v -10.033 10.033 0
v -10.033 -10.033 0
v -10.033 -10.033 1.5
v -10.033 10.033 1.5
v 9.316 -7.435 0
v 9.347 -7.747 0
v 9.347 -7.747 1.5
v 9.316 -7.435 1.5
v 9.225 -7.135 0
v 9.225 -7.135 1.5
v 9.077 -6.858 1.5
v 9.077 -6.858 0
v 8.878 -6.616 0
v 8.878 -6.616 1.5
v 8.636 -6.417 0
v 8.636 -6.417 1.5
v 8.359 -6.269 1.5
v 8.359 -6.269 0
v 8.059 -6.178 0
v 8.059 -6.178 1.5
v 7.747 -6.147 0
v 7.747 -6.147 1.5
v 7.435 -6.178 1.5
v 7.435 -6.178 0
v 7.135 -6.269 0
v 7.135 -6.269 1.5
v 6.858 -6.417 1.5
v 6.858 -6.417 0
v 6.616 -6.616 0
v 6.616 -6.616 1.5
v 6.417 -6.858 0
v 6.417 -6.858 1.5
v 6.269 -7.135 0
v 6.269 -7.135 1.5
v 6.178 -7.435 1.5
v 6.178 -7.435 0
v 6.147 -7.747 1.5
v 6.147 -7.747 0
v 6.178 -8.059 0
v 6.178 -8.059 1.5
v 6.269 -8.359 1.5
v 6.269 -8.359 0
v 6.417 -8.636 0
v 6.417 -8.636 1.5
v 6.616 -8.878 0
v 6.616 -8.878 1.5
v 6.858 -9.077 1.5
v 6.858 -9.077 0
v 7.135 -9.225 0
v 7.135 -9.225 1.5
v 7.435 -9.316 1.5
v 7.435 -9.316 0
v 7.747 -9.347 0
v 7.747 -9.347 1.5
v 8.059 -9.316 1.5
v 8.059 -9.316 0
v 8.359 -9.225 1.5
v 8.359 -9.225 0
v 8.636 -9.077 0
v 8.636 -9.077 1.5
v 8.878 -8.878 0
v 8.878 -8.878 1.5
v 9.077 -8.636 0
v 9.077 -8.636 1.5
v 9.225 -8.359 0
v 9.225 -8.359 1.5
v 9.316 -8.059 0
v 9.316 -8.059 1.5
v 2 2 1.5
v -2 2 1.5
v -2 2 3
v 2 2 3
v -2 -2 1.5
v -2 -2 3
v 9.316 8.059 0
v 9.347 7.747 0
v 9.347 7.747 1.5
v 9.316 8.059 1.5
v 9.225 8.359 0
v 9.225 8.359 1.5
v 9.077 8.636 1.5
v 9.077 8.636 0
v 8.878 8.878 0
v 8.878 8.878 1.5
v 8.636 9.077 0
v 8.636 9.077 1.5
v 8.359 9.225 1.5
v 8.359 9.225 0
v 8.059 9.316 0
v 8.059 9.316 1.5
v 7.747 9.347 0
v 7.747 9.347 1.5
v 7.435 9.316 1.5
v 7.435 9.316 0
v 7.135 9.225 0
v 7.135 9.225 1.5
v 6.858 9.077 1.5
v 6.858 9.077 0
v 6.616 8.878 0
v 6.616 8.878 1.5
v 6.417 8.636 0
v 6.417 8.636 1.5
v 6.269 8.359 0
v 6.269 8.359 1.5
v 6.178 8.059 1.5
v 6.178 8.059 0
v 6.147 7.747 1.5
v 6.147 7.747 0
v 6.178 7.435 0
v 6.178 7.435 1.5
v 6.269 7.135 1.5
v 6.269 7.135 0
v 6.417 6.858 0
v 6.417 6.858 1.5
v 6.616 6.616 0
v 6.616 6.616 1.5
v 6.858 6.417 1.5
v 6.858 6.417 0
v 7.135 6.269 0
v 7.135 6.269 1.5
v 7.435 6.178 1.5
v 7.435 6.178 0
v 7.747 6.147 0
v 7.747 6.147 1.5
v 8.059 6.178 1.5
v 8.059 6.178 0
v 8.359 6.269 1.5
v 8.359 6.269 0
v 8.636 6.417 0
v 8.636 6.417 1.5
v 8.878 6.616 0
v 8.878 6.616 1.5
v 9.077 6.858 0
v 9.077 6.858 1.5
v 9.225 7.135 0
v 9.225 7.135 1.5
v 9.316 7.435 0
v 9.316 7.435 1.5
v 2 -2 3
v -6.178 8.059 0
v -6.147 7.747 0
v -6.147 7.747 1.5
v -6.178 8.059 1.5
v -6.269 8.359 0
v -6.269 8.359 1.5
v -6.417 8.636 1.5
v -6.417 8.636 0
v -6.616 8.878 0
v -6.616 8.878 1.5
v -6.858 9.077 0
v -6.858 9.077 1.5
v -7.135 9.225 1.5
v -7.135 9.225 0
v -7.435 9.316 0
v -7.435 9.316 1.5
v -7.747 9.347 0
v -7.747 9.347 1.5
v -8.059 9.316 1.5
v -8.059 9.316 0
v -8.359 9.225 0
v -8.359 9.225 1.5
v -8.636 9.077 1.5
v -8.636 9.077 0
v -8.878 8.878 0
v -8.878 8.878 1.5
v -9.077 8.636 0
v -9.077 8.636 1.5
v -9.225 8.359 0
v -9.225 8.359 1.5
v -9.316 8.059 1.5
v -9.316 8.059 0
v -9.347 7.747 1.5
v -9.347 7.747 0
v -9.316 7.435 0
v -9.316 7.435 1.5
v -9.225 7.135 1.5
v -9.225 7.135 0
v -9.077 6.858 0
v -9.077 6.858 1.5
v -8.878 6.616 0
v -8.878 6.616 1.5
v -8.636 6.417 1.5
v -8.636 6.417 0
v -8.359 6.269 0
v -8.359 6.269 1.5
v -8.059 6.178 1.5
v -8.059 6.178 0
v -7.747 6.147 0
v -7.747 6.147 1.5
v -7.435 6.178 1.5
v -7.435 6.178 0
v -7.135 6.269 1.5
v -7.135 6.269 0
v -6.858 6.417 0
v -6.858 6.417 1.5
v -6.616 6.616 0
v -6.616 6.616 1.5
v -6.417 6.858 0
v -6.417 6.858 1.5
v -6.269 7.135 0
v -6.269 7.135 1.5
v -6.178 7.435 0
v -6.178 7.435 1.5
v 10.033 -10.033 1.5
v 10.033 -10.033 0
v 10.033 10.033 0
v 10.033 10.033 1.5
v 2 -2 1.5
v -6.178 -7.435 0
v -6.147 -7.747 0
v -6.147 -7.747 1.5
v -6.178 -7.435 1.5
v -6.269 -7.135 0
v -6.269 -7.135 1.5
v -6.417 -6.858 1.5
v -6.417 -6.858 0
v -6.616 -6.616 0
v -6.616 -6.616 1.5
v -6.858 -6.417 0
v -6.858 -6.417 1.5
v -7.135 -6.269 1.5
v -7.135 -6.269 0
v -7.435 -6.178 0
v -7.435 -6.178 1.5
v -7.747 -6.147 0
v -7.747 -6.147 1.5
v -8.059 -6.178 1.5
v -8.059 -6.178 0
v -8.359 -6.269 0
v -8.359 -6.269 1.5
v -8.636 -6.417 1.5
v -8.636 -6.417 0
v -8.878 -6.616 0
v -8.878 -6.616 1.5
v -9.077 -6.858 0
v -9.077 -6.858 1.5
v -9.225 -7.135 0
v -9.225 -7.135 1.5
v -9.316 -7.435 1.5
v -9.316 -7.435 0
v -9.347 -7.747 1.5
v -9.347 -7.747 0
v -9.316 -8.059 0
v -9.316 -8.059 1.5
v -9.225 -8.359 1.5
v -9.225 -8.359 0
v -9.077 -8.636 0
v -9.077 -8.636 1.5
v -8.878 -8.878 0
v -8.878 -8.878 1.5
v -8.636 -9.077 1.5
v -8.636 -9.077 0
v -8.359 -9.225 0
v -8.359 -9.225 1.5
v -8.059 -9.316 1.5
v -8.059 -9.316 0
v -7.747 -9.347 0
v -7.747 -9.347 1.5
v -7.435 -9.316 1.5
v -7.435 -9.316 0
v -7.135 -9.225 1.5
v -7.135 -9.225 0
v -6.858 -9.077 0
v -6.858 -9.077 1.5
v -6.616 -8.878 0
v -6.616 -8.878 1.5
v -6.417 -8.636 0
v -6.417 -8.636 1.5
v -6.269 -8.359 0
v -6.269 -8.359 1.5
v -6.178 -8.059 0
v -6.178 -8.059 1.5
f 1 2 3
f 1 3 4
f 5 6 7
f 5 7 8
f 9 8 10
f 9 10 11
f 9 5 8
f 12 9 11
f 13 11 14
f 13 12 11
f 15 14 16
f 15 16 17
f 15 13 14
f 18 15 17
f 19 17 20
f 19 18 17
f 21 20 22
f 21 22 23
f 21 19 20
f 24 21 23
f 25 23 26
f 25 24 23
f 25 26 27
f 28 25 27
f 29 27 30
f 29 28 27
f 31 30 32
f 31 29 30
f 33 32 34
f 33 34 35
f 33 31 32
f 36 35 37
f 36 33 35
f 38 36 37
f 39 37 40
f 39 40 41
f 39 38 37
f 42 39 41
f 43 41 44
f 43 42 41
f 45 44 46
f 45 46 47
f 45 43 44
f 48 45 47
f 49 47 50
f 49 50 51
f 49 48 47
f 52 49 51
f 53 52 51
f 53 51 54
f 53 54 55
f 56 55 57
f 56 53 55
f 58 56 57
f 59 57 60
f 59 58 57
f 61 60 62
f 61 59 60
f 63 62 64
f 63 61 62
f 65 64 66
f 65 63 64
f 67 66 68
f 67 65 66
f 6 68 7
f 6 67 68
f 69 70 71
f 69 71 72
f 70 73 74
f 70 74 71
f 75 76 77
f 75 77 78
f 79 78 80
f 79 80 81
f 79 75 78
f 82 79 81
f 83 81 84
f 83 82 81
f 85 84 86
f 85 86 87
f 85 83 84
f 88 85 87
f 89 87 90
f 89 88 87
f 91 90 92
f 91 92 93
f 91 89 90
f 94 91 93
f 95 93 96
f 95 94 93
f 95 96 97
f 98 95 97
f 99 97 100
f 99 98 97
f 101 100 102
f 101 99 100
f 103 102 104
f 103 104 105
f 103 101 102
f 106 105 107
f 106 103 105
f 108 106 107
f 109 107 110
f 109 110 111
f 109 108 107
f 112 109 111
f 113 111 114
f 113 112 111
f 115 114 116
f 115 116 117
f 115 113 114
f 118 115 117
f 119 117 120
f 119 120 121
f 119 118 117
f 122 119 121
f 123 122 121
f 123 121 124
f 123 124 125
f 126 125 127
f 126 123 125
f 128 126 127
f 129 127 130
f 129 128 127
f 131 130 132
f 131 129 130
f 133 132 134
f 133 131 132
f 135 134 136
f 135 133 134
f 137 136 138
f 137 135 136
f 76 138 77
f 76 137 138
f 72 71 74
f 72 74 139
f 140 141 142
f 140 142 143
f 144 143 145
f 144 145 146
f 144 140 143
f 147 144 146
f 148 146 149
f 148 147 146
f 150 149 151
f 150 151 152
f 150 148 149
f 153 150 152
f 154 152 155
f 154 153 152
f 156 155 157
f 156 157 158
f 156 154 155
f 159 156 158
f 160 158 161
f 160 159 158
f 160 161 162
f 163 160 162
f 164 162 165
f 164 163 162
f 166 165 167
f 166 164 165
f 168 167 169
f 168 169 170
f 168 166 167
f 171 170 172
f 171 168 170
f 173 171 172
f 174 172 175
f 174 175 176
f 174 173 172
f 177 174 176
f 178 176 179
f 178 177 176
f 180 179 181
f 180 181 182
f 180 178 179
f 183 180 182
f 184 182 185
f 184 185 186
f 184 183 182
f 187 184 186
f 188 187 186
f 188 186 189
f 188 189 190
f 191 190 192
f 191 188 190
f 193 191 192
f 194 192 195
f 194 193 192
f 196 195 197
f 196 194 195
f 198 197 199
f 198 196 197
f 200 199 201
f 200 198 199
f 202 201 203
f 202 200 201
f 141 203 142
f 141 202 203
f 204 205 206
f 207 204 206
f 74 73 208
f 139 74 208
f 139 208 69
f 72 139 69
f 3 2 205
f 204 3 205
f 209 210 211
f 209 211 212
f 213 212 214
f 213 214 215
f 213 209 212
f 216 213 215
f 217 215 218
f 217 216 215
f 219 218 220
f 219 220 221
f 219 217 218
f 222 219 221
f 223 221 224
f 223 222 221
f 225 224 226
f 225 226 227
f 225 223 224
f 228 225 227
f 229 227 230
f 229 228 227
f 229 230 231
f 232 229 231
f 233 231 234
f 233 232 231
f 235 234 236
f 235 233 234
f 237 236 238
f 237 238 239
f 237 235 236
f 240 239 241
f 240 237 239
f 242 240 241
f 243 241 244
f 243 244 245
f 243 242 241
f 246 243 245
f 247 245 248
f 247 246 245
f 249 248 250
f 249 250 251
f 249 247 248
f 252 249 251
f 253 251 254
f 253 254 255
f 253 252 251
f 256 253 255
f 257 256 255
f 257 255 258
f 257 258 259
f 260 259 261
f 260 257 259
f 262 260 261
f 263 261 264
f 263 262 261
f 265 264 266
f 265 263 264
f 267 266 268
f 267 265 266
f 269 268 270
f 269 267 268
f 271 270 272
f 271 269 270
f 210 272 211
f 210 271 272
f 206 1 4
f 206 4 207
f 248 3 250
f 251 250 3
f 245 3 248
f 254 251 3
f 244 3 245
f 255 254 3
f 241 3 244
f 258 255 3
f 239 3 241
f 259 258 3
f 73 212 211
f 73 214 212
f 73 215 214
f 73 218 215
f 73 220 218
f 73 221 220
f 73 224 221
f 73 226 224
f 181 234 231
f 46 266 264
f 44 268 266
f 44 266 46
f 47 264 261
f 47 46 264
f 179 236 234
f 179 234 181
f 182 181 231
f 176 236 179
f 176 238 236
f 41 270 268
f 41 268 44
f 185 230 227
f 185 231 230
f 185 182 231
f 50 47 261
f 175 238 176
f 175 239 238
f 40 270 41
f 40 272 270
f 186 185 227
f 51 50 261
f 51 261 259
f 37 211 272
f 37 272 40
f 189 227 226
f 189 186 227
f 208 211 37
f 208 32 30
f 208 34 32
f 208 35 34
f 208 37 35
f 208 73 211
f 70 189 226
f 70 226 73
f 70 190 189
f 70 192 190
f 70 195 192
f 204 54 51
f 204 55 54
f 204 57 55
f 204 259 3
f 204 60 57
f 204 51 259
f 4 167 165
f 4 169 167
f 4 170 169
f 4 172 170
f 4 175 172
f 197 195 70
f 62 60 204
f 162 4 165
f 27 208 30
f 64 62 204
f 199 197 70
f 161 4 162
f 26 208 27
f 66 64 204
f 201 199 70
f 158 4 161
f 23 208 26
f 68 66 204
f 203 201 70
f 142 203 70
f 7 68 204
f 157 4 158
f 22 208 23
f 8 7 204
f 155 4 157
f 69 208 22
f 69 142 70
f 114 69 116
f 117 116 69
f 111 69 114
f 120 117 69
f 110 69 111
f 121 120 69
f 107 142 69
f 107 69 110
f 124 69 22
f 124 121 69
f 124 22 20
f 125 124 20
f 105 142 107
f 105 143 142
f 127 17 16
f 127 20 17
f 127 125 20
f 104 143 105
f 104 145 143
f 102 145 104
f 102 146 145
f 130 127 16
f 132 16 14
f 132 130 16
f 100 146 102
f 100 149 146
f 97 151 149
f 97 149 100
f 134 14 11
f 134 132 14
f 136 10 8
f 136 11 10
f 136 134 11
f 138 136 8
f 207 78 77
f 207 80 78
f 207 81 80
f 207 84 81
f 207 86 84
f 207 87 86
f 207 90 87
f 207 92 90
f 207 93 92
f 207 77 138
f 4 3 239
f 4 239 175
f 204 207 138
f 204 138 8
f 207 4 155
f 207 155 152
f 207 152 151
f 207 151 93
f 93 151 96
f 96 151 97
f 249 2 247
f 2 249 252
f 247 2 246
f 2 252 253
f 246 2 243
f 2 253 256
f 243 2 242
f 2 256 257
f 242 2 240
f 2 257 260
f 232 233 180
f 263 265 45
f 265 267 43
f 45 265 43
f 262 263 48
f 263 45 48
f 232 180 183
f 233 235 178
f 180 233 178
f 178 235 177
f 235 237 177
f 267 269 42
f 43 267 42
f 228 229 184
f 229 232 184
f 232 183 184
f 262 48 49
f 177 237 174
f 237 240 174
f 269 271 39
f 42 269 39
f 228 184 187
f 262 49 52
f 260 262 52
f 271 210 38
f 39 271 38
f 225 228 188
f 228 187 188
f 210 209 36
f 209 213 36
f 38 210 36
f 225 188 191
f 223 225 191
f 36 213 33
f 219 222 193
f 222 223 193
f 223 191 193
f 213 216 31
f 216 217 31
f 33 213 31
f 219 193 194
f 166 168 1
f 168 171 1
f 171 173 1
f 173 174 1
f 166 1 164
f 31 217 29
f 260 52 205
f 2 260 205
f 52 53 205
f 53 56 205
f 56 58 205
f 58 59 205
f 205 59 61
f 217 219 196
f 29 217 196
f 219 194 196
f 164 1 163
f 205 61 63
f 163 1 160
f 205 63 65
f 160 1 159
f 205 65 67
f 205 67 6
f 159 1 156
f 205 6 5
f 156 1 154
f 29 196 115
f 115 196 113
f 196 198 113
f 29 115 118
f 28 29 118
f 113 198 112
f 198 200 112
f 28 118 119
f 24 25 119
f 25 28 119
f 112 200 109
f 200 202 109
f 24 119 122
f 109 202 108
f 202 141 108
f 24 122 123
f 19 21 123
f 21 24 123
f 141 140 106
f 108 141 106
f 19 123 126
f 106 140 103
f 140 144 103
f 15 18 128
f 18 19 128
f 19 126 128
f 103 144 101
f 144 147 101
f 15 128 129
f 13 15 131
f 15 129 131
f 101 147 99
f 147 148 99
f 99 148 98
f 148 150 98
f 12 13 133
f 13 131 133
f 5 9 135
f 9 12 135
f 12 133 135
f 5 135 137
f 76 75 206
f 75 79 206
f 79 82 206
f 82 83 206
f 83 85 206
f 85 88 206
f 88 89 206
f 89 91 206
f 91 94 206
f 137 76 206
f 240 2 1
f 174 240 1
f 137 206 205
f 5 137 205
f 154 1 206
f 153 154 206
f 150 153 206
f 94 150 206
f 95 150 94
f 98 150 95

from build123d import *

# Parameters (mm, degrees)
SKETCH_1_W      = 20.066
SKETCH_1_H      = 20.066
SKETCH_1_R      = 1.6
EXTRUDE_1_DEPTH = 1.5
SKETCH_2_W      = 4
SKETCH_2_H      = 4
EXTRUDE_2_DEPTH = 1.5


with BuildPart() as part:
    # 草图1 → 凸台-拉伸1 (new body)
    with BuildSketch(Plane.XY):
        Rectangle(SKETCH_1_W, SKETCH_1_H)
        with Locations((-7.747, 7.747)):
            Circle(SKETCH_1_R, mode=Mode.SUBTRACT)
        with Locations((7.747, 7.747)):
            Circle(SKETCH_1_R, mode=Mode.SUBTRACT)
        with Locations((-7.747, -7.747)):
            Circle(SKETCH_1_R, mode=Mode.SUBTRACT)
        with Locations((7.747, -7.747)):
            Circle(SKETCH_1_R, mode=Mode.SUBTRACT)
    extrude(amount=EXTRUDE_1_DEPTH)

    # 草图2 → 凸台-拉伸2 (add)
    with BuildSketch(Plane.XY.offset(1.5)):
        Rectangle(SKETCH_2_W, SKETCH_2_H)
    extrude(amount=EXTRUDE_2_DEPTH)


solid = part.part
